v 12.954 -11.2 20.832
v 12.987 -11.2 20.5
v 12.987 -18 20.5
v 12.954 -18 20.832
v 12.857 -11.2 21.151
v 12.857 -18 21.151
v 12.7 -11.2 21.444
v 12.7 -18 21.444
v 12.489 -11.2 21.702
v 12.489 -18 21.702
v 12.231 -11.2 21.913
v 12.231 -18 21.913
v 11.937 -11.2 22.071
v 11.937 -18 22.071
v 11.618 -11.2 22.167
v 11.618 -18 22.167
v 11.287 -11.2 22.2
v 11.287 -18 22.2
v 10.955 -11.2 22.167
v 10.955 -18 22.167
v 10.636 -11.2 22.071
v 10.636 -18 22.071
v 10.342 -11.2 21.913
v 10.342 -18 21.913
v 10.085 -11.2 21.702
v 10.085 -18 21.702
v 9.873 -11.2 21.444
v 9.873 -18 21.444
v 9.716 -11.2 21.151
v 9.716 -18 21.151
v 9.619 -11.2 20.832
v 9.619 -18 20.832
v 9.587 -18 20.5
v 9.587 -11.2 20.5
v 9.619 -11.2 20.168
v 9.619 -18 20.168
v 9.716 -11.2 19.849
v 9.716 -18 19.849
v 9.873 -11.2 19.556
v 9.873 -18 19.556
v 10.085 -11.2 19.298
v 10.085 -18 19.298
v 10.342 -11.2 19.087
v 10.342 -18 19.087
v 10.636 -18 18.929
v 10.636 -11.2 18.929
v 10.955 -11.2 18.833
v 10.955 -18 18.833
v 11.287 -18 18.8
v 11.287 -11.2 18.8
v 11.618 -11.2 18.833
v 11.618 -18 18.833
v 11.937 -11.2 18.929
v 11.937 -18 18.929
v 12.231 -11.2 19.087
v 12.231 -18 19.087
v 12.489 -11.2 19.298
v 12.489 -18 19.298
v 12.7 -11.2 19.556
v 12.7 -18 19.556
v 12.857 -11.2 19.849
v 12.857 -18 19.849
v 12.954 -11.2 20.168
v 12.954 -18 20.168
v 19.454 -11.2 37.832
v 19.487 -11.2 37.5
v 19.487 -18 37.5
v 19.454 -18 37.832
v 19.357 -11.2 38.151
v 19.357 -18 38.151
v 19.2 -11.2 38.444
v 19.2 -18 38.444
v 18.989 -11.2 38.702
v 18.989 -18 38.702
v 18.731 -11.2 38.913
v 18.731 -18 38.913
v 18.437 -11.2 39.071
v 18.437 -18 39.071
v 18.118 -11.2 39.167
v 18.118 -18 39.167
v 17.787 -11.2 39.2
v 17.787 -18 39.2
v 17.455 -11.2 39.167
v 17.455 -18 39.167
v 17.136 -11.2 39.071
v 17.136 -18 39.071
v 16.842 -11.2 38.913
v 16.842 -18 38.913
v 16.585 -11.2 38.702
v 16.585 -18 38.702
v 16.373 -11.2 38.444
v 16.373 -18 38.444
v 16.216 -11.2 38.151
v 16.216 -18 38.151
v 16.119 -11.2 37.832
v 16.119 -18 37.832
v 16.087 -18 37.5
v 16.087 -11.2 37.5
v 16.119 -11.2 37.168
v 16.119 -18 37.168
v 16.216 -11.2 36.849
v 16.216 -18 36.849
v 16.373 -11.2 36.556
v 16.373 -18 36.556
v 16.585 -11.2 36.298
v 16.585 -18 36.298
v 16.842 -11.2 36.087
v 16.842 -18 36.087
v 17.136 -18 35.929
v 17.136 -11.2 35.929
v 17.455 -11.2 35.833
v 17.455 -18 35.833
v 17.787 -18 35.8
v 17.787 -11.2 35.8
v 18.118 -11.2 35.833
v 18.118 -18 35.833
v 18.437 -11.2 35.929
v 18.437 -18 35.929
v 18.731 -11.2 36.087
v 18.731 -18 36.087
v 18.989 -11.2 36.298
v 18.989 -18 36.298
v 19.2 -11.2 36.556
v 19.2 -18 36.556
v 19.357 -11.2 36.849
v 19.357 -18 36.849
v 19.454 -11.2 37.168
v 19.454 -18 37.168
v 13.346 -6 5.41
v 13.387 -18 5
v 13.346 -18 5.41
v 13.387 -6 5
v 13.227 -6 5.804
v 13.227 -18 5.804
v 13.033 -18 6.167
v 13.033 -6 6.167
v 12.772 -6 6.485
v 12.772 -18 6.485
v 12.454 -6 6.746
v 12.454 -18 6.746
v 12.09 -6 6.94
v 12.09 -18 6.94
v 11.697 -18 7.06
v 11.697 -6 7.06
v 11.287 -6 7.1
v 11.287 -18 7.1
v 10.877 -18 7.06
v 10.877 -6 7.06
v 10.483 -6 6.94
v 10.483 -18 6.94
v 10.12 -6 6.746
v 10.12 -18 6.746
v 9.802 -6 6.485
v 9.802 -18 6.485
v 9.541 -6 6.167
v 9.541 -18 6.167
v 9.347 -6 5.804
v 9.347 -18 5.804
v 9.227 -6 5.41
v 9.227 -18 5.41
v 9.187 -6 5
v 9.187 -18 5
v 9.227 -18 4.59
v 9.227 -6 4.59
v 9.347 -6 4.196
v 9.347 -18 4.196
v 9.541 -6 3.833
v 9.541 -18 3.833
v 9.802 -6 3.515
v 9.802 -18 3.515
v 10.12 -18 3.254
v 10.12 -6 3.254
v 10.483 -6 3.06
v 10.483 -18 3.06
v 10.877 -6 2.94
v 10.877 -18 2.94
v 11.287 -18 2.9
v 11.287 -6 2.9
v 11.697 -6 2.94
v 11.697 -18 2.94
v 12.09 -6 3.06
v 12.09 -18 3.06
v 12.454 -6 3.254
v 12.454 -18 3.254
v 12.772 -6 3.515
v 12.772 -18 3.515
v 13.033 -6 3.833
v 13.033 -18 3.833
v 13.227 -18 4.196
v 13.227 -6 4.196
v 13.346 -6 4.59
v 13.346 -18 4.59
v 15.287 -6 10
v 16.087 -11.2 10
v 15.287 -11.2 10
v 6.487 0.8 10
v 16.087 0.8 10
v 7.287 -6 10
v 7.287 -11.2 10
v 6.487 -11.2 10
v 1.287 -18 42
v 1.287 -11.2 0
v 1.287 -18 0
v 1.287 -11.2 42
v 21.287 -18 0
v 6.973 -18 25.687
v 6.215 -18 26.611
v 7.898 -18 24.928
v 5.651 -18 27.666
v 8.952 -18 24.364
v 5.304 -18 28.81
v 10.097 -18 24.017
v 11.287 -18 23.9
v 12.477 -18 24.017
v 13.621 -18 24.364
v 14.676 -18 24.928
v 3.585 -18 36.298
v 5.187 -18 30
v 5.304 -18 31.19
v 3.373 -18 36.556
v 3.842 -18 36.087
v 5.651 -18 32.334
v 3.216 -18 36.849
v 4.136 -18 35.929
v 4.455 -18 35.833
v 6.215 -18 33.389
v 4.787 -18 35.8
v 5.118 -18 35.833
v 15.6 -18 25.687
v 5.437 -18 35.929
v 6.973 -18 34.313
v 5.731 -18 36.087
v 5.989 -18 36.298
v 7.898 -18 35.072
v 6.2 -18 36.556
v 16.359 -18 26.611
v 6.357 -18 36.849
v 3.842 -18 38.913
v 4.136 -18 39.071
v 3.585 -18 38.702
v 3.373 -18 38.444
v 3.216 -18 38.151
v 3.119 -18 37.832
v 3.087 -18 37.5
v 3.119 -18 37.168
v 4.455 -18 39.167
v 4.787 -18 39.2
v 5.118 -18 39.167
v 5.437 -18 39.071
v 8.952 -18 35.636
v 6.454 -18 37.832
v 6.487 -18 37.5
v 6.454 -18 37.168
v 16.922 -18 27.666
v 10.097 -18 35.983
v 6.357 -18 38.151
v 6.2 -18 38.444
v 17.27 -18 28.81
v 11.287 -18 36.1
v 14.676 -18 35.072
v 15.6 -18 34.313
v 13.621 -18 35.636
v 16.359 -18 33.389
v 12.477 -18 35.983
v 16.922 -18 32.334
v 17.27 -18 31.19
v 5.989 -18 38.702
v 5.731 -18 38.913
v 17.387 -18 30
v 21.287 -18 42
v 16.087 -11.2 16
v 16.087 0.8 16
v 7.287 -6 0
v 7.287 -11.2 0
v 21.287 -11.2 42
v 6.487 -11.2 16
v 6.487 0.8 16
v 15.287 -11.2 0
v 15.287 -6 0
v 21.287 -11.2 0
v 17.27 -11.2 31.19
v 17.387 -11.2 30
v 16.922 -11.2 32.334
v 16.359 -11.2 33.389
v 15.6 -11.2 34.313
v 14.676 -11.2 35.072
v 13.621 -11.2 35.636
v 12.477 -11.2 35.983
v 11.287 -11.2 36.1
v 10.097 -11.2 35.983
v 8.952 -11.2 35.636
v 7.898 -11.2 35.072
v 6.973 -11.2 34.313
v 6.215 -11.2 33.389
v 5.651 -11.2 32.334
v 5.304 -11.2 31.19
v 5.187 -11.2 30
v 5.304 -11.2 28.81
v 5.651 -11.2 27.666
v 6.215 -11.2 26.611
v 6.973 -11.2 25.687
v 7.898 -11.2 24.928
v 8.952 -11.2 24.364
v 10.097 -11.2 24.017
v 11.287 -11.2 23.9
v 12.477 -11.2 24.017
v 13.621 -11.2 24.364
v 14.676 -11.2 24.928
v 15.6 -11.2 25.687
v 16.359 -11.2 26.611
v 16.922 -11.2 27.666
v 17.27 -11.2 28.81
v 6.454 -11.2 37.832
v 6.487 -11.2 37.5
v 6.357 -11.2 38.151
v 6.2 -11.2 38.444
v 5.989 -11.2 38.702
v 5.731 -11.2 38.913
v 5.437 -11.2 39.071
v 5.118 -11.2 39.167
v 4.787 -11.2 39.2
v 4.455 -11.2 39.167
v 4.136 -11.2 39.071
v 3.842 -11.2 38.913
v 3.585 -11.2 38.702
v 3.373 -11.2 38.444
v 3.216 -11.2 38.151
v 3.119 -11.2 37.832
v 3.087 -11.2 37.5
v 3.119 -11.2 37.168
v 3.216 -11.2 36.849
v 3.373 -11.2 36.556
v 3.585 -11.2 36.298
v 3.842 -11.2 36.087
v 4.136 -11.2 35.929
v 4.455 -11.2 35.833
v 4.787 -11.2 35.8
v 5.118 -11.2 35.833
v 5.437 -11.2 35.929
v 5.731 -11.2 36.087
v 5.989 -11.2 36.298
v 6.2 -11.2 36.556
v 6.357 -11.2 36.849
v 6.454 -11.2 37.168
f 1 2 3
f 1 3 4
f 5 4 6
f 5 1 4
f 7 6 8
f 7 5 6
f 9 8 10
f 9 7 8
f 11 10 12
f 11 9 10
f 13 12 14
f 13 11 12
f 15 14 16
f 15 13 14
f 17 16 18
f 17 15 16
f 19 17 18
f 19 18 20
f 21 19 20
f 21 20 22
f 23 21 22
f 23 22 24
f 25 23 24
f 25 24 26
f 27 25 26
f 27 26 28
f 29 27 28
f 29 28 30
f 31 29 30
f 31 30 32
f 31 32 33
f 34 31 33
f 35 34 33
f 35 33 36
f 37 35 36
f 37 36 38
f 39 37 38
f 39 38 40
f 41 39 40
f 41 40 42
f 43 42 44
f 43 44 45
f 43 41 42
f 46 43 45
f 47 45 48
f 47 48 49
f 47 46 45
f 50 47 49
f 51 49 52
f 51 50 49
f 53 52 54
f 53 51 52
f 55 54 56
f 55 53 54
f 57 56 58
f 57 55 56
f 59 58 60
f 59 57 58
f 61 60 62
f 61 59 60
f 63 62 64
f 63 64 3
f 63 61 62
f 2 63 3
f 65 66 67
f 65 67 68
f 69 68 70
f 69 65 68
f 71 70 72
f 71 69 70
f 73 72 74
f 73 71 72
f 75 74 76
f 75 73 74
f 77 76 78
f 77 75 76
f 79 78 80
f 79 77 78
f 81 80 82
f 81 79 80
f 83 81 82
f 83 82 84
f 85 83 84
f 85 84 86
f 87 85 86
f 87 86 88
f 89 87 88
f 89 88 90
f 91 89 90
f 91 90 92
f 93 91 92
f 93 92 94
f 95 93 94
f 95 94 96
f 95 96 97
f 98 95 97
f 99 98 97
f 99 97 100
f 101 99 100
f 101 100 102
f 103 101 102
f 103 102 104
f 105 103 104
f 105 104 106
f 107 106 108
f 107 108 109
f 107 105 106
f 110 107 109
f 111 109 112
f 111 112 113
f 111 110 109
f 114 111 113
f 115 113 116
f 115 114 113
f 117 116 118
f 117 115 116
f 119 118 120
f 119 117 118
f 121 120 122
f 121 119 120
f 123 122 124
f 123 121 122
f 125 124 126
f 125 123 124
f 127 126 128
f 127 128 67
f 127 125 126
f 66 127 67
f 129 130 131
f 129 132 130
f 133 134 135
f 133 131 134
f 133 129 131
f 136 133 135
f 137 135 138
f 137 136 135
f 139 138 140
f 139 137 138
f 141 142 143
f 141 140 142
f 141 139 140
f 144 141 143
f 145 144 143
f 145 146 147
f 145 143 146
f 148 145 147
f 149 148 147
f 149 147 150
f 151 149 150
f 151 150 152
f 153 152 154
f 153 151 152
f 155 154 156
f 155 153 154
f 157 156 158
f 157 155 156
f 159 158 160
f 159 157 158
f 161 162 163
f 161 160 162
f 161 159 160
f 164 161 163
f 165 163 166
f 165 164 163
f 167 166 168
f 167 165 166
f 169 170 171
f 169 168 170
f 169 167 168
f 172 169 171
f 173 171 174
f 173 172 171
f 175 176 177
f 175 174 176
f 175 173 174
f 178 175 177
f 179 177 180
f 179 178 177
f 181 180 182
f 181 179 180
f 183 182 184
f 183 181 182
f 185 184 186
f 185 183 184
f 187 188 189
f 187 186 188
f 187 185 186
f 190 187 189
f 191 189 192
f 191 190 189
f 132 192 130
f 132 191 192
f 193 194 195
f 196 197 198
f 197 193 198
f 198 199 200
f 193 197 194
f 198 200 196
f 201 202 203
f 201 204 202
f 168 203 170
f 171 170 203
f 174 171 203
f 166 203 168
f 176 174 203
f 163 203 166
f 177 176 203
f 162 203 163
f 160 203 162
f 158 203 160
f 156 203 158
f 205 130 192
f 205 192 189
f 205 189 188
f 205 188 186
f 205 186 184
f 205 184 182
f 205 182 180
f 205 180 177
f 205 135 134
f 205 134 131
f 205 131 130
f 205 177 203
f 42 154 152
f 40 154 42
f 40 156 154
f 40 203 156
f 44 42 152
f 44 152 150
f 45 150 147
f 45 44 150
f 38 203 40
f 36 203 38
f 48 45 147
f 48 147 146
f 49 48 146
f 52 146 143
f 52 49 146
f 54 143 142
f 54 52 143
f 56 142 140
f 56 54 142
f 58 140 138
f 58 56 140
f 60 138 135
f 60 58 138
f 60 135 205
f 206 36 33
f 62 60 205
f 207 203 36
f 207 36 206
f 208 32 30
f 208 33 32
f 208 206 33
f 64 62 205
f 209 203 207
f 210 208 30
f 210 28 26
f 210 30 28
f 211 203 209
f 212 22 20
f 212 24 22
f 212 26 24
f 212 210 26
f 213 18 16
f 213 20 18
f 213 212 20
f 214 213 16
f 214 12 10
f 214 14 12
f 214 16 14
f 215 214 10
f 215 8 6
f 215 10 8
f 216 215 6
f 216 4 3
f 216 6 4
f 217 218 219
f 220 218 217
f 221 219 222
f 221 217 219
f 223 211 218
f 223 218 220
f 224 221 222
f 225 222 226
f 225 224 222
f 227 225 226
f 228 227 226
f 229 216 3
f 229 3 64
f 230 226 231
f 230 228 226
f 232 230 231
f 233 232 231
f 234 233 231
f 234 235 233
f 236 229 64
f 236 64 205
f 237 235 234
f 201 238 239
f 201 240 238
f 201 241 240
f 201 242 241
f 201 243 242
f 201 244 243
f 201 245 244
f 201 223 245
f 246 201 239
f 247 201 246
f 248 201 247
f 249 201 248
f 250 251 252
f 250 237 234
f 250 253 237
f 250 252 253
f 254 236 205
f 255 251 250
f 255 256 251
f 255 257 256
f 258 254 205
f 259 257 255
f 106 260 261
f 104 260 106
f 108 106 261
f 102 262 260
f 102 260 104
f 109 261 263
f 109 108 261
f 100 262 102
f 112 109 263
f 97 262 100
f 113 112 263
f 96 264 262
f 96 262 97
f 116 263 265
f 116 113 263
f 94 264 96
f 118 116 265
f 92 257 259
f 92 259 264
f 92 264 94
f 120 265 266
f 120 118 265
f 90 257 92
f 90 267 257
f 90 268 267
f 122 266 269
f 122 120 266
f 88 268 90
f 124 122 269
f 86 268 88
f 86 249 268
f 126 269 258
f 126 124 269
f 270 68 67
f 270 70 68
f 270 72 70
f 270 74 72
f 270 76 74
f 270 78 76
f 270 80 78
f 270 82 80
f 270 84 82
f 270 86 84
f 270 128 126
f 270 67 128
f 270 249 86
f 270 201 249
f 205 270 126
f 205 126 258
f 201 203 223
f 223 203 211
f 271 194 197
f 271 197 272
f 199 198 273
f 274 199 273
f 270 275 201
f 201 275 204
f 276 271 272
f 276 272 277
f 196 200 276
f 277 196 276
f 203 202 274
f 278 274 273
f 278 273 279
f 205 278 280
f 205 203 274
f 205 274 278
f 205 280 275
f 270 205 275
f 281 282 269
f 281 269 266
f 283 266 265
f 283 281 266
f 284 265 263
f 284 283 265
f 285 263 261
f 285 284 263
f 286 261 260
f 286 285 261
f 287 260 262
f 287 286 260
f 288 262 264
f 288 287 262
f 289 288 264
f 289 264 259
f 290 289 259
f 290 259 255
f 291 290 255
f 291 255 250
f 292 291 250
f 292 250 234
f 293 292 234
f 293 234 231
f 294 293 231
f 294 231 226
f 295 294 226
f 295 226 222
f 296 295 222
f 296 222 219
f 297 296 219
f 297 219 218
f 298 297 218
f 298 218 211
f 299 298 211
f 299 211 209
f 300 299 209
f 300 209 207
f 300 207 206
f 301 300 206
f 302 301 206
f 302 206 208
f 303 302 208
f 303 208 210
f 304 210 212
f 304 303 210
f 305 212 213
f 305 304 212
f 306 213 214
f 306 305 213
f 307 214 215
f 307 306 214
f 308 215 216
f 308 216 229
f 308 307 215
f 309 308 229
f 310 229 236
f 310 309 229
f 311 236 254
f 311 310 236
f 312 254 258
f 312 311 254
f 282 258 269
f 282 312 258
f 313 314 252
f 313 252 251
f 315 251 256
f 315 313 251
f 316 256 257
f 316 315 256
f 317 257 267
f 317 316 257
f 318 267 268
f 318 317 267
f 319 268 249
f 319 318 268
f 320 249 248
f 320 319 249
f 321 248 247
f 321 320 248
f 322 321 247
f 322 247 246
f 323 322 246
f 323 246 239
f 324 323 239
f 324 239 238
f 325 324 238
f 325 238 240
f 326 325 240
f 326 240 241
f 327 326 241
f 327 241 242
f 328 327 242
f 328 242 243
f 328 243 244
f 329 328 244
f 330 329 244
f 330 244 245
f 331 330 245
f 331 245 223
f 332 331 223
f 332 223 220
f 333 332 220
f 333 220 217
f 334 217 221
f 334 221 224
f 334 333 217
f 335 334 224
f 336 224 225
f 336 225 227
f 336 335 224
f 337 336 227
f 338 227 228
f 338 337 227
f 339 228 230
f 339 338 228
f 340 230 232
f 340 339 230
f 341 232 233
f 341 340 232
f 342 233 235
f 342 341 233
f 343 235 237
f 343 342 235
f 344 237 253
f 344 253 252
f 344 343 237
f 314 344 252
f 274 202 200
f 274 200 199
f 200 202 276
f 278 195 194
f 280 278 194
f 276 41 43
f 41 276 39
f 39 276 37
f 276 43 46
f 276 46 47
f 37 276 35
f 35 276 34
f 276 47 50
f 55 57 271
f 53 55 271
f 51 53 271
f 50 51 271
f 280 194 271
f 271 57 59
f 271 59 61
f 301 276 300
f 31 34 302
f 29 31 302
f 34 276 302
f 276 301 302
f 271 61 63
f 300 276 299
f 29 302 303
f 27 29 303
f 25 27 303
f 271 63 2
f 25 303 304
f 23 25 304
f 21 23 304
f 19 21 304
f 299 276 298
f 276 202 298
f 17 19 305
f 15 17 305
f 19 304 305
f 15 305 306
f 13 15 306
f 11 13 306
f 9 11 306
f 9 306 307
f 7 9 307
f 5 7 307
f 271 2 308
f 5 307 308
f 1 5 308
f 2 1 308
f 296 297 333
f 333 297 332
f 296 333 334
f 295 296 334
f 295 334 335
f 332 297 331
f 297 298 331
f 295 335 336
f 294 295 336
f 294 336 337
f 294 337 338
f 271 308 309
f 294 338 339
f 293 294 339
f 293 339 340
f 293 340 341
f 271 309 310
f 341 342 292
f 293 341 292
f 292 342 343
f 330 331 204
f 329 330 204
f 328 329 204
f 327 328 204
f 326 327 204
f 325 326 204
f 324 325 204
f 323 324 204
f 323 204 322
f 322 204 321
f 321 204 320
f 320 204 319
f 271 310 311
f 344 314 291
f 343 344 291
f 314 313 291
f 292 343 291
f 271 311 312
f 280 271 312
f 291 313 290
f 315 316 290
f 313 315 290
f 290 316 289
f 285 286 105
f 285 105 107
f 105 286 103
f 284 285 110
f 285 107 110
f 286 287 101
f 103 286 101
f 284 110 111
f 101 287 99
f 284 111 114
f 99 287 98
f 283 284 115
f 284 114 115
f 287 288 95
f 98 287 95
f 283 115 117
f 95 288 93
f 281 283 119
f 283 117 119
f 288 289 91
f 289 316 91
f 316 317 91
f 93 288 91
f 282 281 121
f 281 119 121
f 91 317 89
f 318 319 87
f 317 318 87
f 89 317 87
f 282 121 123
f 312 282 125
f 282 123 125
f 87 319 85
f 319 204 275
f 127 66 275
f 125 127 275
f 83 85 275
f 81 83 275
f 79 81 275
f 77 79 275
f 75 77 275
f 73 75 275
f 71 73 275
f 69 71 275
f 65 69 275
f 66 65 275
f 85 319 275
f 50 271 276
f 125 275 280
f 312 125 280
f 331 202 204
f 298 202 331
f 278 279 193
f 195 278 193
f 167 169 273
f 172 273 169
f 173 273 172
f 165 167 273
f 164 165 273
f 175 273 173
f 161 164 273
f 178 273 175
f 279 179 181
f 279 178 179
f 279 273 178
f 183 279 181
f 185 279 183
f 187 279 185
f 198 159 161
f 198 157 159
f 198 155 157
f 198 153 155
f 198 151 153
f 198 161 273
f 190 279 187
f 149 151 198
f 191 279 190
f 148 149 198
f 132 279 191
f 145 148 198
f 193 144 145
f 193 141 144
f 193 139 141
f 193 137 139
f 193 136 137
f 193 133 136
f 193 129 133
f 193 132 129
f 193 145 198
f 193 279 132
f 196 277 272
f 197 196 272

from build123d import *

# Parameters (mm, degrees)
F0_R      = 1.7
F0_R_2    = 2.1
F0_R_3    = 6.1
F0_W      = 0.8
F0_H      = 6
F1_DEPTH  = 18
F2_W      = 6
F2_H      = 10
F3_DEPTH  = 20.001
F4_DEPTH  = 5.2
F5_W      = 37.3805030249
F5_H      = 33.9431622997
F6_DEPTH  = 6
F7_DEPTH  = 6
F8_W      = 20
F8_H      = 6.8
F9_DEPTH  = 16
F10_DEPTH = 18.001


with BuildPart() as f1:
    # F0 (on Front) → F1 (new body)
    with BuildSketch(Plane.XZ):
        Polygon((1.2868126808, 42), (1.2868126808, 31.58263134), (1.2868126808, 16), (6.4868126808, 16), (7.2868126808, 16), (7.2868126808, 10), (7.2868126808, 0), (15.2868126808, 0), (15.2868126808, 10), (15.2868126808, 16), (16.0868126808, 16), (21.2868126808, 16), (21.2868126808, 31.58263134), (21.2868126808, 42), align=None)
        with Locations((11.2868126808, 20.5)):
            Circle(F0_R, mode=Mode.SUBTRACT)
        with Locations((11.2868126808, 5)):
            Circle(F0_R_2, mode=Mode.SUBTRACT)
        with Locations((11.2868126808, 30)):
            Circle(F0_R_3, mode=Mode.SUBTRACT)
        with Locations((4.7868126808, 37.5)):
            Circle(F0_R, mode=Mode.SUBTRACT)
        with Locations((17.7868126808, 37.5)):
            Circle(F0_R, mode=Mode.SUBTRACT)
        with Locations((6.8868126808, 13)):
            Rectangle(F0_W, F0_H)
        with Locations((15.6868126808, 13)):
            Rectangle(F0_W, F0_H)
    extrude(amount=F1_DEPTH)

    # F2 (on face) → F3 (cut, through all)
    with BuildSketch(Plane.YZ.offset(21.2868126808)):
        with Locations((-3, 5)):
            Rectangle(F2_W, F2_H)
    extrude(amount=-F3_DEPTH, mode=Mode.SUBTRACT)

    # F4 (cut): a face of the model
    f4_faces = [f1.faces().sort_by_distance(p)[0] for p in [
        (20.9094534356, 0, 29),
    ]]
    extrude(f4_faces, amount=-F4_DEPTH, mode=Mode.SUBTRACT)

    # F5 (on face) → F6 (cut)
    with BuildSketch(Plane(origin=(0, -5.2, 0), x_dir=(-1, 0, 0), z_dir=(0, 1, 0))):
        with Locations((-12.0248973835, 32.9715811498)):
            Rectangle(F5_W, F5_H)
    extrude(amount=-F6_DEPTH, mode=Mode.SUBTRACT)

    # F7 (add): a face of the model
    f7_faces = [f1.faces().sort_by_distance(p)[0] for p in [
        (11.2868126808, -5.2, 13),
    ]]
    extrude(f7_faces, amount=F7_DEPTH)

    # F8 (on face) → F9 (join)
    with BuildSketch(Plane(origin=(0, 0, 16), x_dir=(1, 0, 0), z_dir=(0, 0, -1))):
        with Locations((11.2868126808, 14.6)):
            Rectangle(F8_W, F8_H)
    extrude(amount=F9_DEPTH)

    # F0 (on Front) → F10 (cut, through all)
    with BuildSketch(Plane.XZ):
        with Locations((11.2868126808, 5)):
            Circle(F0_R_2)
    extrude(amount=F10_DEPTH, mode=Mode.SUBTRACT)


solid = f1.part
